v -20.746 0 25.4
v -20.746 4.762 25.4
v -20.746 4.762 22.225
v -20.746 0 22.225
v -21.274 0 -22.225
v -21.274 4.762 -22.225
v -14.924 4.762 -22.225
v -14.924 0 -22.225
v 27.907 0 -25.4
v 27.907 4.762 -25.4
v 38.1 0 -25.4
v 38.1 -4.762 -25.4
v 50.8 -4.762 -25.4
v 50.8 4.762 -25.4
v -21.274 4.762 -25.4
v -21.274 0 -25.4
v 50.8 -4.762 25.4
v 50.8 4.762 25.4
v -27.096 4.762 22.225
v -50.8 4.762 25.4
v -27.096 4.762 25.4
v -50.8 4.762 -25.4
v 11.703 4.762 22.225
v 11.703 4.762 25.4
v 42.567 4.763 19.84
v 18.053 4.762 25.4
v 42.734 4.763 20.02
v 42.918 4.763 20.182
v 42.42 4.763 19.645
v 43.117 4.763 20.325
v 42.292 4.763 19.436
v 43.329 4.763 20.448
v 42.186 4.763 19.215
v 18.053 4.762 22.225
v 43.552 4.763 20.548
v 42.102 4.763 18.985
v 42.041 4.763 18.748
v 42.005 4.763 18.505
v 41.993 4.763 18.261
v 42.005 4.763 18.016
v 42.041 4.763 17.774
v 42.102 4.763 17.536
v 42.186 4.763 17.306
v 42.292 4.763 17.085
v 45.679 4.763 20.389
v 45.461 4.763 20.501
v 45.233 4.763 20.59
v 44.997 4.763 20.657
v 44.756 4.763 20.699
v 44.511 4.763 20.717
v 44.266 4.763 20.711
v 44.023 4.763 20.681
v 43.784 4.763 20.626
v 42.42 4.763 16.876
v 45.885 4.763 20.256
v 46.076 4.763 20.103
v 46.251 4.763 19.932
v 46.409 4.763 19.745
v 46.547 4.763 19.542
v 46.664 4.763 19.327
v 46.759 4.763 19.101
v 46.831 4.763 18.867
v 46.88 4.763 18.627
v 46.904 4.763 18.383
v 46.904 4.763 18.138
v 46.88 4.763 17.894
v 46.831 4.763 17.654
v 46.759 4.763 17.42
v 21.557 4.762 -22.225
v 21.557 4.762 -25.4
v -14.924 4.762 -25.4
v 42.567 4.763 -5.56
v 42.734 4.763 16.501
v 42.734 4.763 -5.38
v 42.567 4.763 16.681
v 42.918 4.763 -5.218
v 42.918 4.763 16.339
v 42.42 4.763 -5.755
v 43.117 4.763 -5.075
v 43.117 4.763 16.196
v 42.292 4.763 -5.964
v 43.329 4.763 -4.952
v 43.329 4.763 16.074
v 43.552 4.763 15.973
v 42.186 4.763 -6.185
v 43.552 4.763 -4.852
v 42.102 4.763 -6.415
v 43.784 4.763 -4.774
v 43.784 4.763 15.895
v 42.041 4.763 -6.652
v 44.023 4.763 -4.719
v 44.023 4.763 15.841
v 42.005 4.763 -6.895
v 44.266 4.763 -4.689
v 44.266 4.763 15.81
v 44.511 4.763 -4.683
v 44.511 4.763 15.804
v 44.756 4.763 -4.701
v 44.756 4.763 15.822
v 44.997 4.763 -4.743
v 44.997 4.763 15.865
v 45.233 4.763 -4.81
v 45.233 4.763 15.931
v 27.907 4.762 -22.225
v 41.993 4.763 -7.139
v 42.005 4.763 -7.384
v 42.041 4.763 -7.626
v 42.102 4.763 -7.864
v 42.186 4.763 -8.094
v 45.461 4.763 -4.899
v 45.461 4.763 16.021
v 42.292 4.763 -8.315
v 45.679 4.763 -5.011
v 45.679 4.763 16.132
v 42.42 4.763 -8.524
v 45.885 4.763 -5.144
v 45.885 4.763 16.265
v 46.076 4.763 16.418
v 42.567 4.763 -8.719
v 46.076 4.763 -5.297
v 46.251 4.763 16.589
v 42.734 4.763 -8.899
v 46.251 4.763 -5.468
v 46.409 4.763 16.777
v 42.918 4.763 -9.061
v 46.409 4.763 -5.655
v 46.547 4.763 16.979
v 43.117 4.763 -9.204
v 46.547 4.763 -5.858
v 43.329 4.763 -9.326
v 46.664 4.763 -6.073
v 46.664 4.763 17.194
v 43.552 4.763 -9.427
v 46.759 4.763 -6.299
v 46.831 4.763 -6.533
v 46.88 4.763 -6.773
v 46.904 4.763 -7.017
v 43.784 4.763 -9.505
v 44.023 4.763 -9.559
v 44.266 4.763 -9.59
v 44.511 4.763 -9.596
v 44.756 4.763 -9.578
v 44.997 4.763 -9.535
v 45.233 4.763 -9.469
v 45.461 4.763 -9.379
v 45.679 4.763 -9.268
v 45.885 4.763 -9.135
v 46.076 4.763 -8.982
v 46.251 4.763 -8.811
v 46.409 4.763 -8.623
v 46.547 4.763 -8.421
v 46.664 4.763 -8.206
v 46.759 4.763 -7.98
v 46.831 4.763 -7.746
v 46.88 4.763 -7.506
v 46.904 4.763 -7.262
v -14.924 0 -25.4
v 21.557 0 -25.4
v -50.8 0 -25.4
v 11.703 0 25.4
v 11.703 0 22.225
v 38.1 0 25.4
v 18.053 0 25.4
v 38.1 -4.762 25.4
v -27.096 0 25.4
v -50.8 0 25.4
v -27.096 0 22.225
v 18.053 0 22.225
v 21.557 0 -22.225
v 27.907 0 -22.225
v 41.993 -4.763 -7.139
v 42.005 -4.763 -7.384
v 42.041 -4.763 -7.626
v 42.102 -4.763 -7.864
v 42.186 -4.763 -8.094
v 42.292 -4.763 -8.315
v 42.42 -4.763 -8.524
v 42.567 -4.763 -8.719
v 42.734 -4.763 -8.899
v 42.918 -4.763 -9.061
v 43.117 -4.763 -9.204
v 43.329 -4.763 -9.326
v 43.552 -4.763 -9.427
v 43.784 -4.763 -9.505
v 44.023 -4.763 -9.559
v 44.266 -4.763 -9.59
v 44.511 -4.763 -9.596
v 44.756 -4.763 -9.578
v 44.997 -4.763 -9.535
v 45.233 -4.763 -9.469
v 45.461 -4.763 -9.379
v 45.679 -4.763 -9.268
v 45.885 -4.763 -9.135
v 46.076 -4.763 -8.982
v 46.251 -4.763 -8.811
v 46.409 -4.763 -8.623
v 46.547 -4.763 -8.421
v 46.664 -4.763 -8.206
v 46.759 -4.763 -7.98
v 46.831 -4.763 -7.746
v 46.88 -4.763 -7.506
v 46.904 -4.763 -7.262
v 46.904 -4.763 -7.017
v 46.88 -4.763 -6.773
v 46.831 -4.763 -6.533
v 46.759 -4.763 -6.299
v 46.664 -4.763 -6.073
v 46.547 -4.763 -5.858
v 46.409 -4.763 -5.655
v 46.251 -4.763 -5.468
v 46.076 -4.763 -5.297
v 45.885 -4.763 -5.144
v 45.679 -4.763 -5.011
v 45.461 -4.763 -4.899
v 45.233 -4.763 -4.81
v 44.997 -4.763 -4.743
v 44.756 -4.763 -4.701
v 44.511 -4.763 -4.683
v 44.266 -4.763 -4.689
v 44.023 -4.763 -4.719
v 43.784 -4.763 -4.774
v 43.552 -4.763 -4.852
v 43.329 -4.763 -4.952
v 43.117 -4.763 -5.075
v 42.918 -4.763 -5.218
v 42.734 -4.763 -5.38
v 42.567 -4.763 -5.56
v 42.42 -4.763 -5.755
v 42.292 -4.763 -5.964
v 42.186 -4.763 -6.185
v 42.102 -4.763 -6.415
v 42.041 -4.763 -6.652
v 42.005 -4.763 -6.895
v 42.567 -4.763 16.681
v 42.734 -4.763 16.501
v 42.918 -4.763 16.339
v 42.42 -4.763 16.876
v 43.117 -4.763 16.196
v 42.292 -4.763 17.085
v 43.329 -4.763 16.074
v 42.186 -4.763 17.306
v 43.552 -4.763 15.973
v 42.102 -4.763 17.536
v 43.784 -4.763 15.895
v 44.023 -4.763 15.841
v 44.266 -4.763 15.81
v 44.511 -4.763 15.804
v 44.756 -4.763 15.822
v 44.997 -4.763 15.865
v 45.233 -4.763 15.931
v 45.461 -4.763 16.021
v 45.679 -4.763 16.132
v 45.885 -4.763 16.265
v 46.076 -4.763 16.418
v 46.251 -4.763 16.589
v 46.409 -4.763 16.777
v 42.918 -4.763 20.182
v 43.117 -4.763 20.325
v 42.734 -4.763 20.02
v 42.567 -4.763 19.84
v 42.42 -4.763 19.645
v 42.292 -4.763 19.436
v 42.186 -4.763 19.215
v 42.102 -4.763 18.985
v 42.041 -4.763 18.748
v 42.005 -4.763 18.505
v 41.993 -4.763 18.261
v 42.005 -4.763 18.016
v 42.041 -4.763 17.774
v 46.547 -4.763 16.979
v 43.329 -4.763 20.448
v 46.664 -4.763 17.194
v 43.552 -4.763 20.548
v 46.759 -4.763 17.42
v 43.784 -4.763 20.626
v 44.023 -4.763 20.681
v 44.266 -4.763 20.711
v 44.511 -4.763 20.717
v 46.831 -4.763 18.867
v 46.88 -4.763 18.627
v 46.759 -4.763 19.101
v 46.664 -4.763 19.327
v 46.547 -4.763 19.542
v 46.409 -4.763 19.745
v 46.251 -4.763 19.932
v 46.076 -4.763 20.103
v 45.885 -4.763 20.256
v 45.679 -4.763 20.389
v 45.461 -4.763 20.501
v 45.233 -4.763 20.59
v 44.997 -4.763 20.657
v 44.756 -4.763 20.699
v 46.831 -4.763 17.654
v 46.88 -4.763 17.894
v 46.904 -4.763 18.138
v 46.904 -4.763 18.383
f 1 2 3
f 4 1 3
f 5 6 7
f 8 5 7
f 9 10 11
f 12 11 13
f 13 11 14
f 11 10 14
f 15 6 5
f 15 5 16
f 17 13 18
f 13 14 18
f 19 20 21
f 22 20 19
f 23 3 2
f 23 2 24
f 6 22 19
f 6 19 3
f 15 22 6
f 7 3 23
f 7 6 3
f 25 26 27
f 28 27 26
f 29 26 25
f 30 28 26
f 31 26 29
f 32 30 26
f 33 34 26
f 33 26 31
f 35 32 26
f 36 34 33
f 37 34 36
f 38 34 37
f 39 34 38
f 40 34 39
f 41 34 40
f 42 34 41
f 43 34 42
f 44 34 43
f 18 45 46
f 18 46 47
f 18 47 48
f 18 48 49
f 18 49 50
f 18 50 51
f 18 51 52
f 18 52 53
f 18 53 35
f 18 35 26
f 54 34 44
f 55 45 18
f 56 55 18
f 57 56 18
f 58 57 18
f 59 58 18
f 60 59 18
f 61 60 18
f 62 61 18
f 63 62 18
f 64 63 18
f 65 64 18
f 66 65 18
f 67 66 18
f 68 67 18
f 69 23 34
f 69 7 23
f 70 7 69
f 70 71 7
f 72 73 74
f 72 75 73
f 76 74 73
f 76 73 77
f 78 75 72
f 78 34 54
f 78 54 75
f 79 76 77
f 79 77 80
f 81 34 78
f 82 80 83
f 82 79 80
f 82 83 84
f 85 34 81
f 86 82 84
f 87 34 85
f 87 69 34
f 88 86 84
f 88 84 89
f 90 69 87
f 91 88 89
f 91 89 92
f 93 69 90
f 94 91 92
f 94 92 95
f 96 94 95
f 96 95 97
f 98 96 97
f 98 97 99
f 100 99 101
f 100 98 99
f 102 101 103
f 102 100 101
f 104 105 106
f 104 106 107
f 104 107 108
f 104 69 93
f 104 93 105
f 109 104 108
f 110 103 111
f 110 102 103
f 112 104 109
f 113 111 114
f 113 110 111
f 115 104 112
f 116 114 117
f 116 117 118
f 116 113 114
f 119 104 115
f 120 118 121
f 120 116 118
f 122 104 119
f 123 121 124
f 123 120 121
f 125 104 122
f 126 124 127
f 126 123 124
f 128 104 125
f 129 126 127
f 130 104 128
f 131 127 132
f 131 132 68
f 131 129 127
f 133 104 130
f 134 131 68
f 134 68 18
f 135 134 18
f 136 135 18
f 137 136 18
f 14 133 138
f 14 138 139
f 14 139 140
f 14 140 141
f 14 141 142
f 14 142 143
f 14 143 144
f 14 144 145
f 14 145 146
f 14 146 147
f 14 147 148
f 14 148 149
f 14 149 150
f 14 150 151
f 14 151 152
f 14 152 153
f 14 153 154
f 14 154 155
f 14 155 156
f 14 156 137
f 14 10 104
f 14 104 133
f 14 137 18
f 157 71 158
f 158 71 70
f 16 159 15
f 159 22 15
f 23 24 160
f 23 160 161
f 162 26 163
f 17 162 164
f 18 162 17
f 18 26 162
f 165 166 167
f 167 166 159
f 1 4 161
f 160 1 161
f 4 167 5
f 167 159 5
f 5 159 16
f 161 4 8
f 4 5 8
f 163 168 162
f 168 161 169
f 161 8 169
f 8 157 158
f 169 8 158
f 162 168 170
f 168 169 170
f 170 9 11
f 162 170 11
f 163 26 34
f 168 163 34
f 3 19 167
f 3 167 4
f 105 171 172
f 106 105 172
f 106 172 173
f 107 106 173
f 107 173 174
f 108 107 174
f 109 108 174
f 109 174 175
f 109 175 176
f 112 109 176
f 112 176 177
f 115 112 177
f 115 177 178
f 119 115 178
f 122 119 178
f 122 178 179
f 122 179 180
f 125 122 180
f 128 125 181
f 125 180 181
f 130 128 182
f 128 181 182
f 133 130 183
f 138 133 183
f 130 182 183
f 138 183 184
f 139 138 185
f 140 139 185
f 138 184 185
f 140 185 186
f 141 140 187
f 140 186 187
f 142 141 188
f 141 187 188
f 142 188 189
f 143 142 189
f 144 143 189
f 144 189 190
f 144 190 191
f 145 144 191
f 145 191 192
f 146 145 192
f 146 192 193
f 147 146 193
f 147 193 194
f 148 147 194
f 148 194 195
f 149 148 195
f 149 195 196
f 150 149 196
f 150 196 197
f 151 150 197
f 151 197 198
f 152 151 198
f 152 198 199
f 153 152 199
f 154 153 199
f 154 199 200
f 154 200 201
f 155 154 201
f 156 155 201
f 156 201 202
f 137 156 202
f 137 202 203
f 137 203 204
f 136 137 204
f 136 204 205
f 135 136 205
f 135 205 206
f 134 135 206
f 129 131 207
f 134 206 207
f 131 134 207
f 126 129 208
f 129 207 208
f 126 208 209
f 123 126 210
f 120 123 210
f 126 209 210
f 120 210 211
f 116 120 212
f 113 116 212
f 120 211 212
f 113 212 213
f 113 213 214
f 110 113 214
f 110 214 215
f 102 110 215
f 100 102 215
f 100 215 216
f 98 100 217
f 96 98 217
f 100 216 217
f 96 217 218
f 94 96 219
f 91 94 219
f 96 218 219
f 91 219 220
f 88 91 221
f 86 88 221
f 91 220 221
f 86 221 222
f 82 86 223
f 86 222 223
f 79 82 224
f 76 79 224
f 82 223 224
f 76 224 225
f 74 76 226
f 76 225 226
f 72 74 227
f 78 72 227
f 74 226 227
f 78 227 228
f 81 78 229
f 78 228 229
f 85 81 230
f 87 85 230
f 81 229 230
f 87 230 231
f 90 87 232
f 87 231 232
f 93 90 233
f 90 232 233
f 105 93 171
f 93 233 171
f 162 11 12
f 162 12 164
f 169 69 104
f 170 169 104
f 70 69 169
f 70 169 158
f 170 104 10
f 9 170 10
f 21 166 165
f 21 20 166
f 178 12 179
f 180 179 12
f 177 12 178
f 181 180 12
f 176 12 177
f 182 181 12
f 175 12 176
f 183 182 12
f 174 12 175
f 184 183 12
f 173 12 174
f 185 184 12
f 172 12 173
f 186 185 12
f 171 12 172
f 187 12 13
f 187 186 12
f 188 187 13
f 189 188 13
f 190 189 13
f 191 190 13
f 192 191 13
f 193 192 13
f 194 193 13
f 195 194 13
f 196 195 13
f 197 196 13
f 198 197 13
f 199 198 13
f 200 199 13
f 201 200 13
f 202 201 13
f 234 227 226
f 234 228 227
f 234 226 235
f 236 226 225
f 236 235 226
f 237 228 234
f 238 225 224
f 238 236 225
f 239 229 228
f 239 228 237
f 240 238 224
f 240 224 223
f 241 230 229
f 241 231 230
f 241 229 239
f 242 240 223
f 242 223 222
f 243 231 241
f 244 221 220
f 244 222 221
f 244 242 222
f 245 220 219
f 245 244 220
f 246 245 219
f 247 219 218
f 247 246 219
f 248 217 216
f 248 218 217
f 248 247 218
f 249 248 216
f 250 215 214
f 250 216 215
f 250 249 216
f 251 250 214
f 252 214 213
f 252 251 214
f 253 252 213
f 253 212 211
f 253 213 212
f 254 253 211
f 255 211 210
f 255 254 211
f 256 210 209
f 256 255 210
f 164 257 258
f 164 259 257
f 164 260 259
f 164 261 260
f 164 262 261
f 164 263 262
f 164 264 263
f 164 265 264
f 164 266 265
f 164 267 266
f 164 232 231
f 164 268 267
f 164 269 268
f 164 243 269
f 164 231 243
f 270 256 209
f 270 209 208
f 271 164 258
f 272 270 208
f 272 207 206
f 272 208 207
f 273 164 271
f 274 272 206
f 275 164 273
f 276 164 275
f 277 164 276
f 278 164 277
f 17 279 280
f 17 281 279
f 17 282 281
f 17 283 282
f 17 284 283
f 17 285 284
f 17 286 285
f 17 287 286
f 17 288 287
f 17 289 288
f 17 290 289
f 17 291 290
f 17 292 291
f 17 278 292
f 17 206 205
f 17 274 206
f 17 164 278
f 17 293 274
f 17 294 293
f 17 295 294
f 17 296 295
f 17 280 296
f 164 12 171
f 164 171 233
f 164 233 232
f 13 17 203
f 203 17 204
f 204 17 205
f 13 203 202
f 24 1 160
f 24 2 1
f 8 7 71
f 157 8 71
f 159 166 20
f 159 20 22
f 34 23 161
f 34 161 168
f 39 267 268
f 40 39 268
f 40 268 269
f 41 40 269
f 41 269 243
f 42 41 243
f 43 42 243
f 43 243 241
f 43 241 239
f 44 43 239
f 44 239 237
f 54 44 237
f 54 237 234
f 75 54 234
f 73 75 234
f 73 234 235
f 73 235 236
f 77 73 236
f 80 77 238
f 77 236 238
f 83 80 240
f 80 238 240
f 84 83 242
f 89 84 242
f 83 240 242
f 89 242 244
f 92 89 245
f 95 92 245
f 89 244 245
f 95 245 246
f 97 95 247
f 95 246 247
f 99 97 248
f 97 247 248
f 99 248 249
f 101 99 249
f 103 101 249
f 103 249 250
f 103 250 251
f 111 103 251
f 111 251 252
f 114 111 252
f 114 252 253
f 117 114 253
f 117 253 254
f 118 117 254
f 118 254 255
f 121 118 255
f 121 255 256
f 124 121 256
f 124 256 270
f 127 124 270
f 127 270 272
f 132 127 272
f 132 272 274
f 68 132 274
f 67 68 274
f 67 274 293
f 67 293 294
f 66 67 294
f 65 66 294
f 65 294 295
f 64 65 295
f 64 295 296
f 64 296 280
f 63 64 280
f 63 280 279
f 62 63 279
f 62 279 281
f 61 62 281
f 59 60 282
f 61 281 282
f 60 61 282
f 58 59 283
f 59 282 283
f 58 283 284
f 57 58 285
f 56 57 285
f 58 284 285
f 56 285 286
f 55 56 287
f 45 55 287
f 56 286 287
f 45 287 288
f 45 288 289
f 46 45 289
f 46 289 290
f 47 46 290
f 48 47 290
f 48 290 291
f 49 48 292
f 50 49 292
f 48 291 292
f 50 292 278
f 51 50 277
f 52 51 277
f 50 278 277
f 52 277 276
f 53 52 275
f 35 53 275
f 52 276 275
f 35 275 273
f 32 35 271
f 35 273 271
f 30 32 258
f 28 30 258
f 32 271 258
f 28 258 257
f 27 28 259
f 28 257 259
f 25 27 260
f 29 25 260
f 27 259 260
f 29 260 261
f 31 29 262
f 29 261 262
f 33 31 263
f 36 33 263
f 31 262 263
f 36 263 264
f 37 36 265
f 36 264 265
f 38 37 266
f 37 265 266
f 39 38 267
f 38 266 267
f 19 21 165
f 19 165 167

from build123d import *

# Parameters (mm, degrees)
SKETCH1_W                    = 101.6
SKETCH1_H                    = 50.8
BOSS_EXTRUDE1_DEPTH          = 4.7625
SKETCH3_W                    = 12.7
SKETCH3_H                    = 50.8
BOSS_EXTRUDE2_DEPTH          = 4.7625
F_10_0_1935_DIAMETER_HOLE1_D = 4.9149
SKETCH9_W                    = 6.35
SKETCH9_H                    = 3.175
CUT_EXTRUDE1_DEPTH           = 58.589283942


with BuildPart() as part:
    # Sketch1 → Boss-Extrude1 (new body)
    with BuildSketch(Plane(origin=(0, 0, 0), x_dir=(1, 0, 0), z_dir=(0, 1, 0))):
        Rectangle(SKETCH1_W, SKETCH1_H)
    extrude(amount=BOSS_EXTRUDE1_DEPTH)

    # Sketch3 → Boss-Extrude2 (add)
    with BuildSketch(Plane.XZ):
        with Locations((44.45, 0)):
            Rectangle(SKETCH3_W, SKETCH3_H)
    extrude(amount=BOSS_EXTRUDE2_DEPTH)

    # #10 (0.1935) Diameter Hole1 (through all)
    with Locations(Plane(origin=(0, 4.7625, 0), x_dir=(1, 0, 0), z_dir=(0, 1, 0))):
        with Locations((44.45, 7.139305), (44.45, -18.260695)):
            Hole(F_10_0_1935_DIAMETER_HOLE1_D / 2)

    # Sketch9 → Cut-Extrude1 (cut, through all)
    with BuildSketch(Plane(origin=(0, 4.7625, 0), x_dir=(1, 0, 0), z_dir=(0, 1, 0))):
        with Locations((24.731908969, 23.8125)):
            Rectangle(SKETCH9_W, SKETCH9_H)
        with Locations((-18.099171267, 23.8125)):
            Rectangle(SKETCH9_W, SKETCH9_H)
        with Locations((-23.921416816, -23.8125)):
            Rectangle(SKETCH9_W, SKETCH9_H)
        with Locations((14.878103248, -23.8125)):
            Rectangle(SKETCH9_W, SKETCH9_H)
    extrude(amount=-CUT_EXTRUDE1_DEPTH, mode=Mode.SUBTRACT)


solid = part.part
